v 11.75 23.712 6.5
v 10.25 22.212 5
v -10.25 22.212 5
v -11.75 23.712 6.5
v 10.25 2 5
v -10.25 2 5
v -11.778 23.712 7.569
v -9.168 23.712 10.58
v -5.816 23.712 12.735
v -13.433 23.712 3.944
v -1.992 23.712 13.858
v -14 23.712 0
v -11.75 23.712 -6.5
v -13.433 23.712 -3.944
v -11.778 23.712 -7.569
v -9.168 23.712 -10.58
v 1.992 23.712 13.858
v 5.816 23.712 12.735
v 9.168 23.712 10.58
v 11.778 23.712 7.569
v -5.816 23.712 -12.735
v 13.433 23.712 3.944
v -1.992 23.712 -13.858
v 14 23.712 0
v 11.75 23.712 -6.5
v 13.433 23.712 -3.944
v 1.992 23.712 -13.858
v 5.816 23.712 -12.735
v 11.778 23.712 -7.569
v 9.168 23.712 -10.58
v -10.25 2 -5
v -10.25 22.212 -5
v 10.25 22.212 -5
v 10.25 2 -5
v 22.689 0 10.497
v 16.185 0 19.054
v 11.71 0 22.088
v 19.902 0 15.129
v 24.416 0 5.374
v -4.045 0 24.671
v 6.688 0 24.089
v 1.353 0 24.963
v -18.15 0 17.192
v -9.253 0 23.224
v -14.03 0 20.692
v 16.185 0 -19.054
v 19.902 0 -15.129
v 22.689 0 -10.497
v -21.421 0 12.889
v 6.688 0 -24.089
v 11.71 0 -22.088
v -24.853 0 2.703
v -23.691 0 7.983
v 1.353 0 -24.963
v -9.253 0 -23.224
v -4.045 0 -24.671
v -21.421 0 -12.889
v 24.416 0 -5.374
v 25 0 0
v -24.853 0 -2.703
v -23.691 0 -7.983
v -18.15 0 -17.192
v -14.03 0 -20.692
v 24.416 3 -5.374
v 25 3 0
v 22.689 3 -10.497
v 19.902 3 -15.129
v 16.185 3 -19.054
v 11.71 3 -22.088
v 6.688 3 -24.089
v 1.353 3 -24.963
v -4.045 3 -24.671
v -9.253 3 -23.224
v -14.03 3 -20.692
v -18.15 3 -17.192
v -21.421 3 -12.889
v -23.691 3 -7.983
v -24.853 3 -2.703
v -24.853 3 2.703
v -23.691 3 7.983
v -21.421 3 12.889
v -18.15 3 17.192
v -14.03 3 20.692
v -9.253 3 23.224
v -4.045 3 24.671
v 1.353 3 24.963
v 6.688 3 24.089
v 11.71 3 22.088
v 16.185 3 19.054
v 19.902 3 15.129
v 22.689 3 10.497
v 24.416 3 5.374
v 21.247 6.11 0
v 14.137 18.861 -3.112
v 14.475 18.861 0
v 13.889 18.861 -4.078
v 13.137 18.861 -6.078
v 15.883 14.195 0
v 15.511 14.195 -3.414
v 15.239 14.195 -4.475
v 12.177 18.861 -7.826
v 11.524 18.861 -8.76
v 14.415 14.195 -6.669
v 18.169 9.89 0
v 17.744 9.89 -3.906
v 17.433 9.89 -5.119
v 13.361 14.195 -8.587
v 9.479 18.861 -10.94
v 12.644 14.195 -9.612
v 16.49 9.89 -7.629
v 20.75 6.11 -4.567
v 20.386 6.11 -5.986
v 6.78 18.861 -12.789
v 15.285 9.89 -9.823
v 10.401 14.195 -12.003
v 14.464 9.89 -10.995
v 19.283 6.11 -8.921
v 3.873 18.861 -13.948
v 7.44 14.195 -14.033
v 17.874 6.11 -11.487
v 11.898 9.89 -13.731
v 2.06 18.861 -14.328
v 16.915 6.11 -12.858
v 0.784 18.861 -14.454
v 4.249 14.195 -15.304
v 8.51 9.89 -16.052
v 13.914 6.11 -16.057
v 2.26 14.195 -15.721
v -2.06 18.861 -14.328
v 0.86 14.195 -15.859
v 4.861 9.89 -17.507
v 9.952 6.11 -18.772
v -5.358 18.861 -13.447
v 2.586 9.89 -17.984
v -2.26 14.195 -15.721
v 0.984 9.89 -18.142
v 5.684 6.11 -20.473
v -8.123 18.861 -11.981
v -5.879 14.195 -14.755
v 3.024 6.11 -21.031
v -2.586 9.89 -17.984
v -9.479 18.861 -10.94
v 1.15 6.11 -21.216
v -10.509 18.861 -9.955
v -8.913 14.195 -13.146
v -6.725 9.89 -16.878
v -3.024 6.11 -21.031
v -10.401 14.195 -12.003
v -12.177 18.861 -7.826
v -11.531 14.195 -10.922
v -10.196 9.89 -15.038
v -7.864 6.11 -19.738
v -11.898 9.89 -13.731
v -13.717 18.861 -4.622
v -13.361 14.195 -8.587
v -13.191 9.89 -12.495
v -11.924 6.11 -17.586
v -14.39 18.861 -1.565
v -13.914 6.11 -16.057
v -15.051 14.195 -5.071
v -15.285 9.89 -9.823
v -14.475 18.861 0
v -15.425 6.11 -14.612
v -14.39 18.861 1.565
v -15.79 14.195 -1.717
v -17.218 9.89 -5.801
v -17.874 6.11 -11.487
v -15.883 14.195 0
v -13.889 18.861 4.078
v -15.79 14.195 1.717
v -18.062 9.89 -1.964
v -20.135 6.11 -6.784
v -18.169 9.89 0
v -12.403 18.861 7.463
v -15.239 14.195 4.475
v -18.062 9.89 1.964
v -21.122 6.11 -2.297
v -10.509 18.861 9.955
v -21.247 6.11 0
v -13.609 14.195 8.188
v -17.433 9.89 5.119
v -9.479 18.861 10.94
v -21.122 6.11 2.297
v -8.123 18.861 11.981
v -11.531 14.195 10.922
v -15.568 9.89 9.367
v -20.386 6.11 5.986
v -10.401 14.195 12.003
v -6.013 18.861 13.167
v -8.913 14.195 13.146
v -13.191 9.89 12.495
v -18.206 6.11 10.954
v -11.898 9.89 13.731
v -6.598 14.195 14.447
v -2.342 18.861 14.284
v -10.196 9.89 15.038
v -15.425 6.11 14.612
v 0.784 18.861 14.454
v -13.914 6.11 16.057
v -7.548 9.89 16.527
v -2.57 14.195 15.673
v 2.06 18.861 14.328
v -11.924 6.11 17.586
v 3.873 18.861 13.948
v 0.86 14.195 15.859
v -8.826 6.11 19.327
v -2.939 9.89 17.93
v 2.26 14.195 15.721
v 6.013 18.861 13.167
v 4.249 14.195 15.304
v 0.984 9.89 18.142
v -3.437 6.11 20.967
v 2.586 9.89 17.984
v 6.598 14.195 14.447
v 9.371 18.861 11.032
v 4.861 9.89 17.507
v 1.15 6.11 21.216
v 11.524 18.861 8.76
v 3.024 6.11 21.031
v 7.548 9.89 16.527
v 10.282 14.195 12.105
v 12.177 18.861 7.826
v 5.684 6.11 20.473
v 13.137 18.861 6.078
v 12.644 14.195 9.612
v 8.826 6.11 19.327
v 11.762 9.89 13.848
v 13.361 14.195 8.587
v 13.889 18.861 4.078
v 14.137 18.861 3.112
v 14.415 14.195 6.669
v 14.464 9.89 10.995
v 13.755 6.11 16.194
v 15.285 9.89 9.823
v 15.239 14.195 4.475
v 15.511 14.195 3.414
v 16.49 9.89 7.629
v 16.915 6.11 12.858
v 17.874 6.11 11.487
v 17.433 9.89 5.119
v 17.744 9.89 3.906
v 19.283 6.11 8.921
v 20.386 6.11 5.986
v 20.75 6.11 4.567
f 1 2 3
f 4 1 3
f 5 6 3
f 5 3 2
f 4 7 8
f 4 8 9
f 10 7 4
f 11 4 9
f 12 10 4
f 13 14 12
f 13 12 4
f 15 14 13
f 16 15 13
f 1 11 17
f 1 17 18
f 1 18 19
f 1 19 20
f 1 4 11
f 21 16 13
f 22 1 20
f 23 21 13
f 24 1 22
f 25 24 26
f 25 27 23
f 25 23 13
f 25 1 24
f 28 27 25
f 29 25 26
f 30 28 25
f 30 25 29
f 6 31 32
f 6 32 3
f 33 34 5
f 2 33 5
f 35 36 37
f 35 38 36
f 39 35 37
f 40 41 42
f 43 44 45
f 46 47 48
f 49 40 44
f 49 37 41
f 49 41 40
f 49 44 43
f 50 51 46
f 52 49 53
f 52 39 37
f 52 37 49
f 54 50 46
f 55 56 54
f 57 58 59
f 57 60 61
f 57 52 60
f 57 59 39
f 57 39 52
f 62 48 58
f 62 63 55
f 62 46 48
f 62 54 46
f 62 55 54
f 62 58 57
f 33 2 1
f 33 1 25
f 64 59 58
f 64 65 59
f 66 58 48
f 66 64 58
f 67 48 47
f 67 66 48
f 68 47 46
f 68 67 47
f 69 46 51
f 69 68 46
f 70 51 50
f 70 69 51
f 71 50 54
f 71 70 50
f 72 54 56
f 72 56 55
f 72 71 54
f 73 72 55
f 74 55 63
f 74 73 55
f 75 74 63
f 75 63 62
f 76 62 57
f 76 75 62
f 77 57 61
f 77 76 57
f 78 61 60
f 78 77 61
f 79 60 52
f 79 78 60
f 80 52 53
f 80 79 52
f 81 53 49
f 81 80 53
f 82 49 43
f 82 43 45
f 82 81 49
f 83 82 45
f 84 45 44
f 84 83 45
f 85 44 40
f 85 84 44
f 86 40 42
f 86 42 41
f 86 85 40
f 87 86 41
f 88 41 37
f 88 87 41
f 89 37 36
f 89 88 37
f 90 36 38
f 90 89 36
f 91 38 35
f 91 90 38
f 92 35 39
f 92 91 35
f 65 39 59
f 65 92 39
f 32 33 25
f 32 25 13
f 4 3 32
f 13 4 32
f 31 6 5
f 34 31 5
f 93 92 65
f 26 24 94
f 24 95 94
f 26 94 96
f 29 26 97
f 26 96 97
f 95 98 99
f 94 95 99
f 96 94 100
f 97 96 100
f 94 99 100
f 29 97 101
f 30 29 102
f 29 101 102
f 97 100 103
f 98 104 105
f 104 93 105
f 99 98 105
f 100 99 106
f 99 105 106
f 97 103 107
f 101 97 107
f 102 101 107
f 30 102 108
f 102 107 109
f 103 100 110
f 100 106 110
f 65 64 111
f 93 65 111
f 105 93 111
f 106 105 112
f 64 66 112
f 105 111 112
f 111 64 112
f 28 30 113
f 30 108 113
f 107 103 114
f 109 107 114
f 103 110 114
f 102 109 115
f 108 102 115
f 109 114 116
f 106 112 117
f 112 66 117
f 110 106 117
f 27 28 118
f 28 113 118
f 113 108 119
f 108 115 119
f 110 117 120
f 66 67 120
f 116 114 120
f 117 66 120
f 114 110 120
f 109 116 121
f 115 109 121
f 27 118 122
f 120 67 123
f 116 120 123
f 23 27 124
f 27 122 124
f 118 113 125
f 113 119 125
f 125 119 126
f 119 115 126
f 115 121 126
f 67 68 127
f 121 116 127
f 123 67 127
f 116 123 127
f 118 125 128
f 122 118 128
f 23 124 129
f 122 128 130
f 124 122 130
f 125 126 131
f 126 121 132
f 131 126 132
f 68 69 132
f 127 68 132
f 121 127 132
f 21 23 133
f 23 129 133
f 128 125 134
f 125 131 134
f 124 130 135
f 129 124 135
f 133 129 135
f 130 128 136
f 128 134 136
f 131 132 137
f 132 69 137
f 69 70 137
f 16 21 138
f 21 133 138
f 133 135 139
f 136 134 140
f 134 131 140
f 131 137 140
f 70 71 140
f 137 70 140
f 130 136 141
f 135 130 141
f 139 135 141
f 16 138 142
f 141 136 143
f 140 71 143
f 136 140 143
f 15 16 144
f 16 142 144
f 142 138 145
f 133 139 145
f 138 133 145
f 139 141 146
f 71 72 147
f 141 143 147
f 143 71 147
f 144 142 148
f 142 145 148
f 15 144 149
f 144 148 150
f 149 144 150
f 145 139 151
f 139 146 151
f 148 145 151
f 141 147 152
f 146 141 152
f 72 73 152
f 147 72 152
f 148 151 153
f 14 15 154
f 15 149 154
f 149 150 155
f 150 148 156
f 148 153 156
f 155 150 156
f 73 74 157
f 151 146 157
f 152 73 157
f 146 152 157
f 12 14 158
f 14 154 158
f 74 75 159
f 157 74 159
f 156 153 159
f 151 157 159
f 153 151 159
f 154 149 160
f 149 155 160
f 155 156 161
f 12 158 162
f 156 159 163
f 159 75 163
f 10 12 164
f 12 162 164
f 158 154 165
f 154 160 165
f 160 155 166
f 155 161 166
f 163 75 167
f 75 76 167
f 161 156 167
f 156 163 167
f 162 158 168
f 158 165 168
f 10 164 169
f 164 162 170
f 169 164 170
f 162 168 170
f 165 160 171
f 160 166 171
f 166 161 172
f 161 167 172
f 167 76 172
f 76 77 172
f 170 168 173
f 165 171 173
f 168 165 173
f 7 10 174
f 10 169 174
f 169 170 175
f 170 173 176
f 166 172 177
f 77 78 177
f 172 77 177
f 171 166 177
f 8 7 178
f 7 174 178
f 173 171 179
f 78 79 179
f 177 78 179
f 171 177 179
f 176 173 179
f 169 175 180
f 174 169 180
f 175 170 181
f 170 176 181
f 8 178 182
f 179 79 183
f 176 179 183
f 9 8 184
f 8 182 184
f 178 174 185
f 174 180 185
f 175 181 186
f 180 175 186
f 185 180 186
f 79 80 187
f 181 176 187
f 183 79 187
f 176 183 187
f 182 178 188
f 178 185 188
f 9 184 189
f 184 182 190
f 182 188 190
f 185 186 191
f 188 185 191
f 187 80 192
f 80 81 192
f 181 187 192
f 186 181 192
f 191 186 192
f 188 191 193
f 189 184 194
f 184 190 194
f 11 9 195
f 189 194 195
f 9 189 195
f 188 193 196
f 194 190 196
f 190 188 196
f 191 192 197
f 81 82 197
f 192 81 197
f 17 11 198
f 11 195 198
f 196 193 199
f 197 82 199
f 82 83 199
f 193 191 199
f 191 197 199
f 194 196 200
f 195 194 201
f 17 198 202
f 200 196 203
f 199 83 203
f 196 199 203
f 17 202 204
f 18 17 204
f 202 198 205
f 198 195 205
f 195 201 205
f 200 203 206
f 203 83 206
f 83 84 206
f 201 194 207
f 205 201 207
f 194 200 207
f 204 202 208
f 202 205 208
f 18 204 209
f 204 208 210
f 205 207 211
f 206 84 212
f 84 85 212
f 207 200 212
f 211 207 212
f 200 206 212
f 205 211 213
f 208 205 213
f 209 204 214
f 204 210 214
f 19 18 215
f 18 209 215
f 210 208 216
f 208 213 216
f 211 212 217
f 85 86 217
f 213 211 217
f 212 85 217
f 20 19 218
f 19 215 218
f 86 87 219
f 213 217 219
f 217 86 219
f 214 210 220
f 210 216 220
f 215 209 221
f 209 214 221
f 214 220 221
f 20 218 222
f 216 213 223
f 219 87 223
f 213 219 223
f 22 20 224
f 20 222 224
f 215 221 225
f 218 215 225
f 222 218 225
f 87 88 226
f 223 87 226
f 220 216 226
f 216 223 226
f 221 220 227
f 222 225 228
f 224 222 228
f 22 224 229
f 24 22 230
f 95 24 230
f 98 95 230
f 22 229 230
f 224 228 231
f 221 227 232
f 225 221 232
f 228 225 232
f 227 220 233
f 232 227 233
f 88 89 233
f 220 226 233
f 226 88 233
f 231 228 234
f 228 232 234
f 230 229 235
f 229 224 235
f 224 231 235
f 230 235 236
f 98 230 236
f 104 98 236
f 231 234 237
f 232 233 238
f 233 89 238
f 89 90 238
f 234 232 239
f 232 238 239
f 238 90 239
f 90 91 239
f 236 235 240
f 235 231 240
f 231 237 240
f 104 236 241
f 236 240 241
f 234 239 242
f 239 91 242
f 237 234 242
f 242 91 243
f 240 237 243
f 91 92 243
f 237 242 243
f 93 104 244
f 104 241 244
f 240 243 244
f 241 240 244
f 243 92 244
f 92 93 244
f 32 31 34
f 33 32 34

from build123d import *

# Parameters (mm, degrees)
SKETCH001_W  = 20.5
SKETCH001_H  = 10
POCKET_DEPTH = 21.713315
CHAMFER_SIZE = 1.5


with BuildPart() as part:
    # Sketch → Revolution (revolve)
    with BuildSketch(Plane.XY):
        with BuildLine():
            Line((0, 0), (25, 0))
            Line((25, 0), (25, 3))
            ThreePointArc((14, 23.712315), (16.920598, 11.986276), (25, 3))
            Line((14, 23.712315), (0, 23.712315))
            Line((0, 23.712315), (0, 0))
        make_face()
    revolve(axis=Axis((0, 0, 0), (0, 1, 0)))

    # Sketch001 → Pocket (cut, through all)
    with BuildSketch(Plane.XZ.offset(-2)):
        Rectangle(SKETCH001_W, SKETCH001_H)
    extrude(amount=-POCKET_DEPTH, mode=Mode.SUBTRACT)

    # Chamfer
    chamfer_edges = [part.edges().sort_by_distance(p)[0] for p in [
        (0, 23.712315, -5),
        (10.25, 23.712315, 0),
        (0, 23.712315, 5),
        (-10.25, 23.712315, 0),
    ]]
    chamfer(chamfer_edges, length=CHAMFER_SIZE)


solid = part.part
